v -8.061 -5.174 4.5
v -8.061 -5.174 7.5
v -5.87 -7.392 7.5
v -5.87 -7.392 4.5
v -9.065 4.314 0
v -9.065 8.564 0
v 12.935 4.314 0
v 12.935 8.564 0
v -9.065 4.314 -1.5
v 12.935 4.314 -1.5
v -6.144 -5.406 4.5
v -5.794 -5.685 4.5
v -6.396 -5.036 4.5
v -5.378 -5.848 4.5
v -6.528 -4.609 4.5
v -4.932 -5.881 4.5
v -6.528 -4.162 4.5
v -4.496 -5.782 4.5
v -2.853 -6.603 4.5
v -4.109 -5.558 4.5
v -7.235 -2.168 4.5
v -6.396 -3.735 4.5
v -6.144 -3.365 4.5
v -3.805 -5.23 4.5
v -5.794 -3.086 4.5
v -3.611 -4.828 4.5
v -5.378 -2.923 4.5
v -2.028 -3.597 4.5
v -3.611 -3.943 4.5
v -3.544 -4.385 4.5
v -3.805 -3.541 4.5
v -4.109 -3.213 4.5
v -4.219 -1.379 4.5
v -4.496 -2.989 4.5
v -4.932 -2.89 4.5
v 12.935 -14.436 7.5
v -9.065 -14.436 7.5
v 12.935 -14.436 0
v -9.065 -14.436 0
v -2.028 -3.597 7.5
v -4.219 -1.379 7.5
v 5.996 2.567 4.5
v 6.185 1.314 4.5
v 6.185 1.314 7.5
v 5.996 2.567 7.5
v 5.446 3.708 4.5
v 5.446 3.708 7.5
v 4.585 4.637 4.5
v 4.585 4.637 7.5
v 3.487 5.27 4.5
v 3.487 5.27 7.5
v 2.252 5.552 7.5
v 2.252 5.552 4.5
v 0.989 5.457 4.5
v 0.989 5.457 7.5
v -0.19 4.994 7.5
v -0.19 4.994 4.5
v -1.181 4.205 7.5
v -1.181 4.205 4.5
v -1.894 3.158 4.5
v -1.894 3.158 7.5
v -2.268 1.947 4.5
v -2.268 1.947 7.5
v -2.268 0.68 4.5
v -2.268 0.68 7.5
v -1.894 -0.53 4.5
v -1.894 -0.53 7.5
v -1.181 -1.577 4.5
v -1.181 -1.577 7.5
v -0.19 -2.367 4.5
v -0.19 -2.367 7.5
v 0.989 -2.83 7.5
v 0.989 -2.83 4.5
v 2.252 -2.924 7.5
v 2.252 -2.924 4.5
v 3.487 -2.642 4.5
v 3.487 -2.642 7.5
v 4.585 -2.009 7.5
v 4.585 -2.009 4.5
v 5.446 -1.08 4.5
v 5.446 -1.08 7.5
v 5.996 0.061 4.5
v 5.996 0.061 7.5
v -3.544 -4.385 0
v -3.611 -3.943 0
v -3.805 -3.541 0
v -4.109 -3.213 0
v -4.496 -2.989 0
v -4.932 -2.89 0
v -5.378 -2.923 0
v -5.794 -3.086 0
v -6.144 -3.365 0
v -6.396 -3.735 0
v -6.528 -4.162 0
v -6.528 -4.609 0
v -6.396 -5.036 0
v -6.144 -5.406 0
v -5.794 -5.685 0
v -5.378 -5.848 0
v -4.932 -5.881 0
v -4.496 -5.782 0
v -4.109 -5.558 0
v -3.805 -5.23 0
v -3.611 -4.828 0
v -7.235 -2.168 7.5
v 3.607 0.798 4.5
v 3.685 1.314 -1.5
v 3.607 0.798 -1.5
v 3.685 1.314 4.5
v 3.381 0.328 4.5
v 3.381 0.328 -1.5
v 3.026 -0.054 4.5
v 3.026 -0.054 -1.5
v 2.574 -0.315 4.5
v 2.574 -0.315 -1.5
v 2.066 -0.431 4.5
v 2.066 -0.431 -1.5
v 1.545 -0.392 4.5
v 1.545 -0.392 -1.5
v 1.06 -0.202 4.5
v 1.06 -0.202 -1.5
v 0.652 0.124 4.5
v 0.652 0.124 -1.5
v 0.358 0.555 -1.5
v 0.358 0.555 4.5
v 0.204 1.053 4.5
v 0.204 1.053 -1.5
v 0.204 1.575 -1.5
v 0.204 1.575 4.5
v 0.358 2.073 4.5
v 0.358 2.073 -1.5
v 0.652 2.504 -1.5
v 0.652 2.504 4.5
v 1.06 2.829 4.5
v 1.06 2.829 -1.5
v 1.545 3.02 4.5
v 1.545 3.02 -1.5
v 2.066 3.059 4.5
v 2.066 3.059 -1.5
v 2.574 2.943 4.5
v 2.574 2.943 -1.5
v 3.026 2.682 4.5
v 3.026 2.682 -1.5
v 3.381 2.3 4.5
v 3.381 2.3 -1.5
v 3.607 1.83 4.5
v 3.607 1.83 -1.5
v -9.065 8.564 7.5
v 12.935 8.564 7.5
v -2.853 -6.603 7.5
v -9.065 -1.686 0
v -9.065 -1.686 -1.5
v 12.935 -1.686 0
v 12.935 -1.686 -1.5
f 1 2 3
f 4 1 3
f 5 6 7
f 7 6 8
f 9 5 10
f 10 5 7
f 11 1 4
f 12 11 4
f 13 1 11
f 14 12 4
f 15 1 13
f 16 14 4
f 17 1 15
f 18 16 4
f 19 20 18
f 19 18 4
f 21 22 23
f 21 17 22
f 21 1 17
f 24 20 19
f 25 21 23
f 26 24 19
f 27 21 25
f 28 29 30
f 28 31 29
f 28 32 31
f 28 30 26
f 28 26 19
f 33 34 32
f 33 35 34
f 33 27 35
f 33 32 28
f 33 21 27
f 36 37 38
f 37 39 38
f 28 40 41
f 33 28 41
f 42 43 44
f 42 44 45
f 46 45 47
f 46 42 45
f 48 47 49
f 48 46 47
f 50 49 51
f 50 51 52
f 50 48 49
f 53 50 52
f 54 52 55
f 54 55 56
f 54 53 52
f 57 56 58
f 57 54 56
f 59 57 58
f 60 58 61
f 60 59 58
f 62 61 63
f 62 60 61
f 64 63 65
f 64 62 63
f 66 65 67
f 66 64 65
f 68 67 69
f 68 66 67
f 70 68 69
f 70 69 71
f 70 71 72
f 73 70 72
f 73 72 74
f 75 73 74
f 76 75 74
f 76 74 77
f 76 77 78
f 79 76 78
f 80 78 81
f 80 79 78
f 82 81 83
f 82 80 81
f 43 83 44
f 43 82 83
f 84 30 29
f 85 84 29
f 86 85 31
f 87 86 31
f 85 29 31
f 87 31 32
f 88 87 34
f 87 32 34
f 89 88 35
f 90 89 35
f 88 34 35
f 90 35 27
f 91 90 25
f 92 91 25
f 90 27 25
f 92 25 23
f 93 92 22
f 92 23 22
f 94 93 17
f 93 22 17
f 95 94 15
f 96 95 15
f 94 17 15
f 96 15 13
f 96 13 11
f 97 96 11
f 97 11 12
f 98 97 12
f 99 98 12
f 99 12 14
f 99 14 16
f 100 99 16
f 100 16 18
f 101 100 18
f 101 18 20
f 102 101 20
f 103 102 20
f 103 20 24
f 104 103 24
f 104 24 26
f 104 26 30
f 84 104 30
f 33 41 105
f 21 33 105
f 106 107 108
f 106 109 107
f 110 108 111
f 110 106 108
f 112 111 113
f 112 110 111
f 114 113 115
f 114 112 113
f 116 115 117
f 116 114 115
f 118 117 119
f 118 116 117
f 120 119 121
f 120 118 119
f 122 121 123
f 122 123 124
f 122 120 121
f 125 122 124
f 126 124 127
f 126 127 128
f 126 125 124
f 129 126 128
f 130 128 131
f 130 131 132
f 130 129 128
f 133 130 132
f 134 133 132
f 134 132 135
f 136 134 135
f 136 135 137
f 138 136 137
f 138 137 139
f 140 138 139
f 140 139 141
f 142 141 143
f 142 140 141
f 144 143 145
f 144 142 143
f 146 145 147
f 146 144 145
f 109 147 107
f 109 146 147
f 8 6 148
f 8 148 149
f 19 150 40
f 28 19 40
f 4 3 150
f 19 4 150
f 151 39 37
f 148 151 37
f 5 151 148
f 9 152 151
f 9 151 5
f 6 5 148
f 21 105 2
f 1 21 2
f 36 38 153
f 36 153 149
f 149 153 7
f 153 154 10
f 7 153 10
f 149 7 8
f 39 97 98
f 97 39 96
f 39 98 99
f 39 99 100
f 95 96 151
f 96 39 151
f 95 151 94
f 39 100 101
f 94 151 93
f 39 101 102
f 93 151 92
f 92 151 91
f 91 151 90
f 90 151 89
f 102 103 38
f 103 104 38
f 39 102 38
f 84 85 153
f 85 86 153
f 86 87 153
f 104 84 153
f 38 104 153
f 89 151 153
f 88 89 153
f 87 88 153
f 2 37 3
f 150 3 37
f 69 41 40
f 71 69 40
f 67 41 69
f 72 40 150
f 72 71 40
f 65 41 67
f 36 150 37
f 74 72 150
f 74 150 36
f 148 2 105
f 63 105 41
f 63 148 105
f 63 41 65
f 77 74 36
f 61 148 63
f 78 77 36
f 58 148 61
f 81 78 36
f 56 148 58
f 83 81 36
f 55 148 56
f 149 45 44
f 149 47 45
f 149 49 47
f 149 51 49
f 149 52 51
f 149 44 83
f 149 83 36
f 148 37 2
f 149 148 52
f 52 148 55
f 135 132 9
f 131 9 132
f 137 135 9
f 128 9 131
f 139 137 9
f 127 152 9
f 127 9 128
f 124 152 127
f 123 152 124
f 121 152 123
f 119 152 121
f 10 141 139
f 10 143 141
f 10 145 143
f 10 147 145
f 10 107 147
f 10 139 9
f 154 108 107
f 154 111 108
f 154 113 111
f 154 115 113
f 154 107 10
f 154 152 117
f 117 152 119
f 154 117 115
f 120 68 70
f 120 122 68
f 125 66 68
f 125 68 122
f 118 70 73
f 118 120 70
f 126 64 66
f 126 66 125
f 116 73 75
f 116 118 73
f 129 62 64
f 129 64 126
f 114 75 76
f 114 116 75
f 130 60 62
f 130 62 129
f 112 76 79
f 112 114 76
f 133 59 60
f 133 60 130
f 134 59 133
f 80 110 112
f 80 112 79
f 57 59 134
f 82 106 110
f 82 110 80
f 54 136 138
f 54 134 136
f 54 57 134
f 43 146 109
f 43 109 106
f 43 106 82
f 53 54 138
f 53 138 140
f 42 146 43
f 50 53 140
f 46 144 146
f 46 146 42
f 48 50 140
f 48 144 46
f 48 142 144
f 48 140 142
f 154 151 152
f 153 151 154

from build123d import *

# Parameters (mm, degrees)
F0_W     = 22
F0_H     = 23
F1_DEPTH = 4.5
F2_R     = 1.75
F3_DEPTH = 4.501
F4_W     = 22
F4_H     = 6
F4_R     = 1.75
F5_DEPTH = 1.5
F2_W     = 22
F2_H     = 23
F2_R_2   = 4.25
F2_R_3   = 1.5
F6_DEPTH = 3
F7_R     = 1.5
F8_DEPTH = 3
F9_DEPTH = 9.001


with BuildPart() as f1:
    # F0 (on Top) → F1 (new body)
    with BuildSketch(Plane.XY):
        with Locations((1.9347620532, -2.93618536)):
            Rectangle(F0_W, F0_H)
    extrude(amount=F1_DEPTH)

    # F2 (on face) → F3 (cut, through all)
    with BuildSketch(Plane.XY.offset(4.5)):
        with Locations((1.9347620532, 1.31381464)):
            Circle(F2_R)
    extrude(amount=-F3_DEPTH, mode=Mode.SUBTRACT)

    # F4 (on face) → F5 (join)
    with BuildSketch(Plane(origin=(0, 0, 0), x_dir=(1, 0, 0), z_dir=(0, 0, -1))):
        with Locations((1.9347620532, -1.31381464)):
            Rectangle(F4_W, F4_H)
        with Locations((1.9347620532, -1.31381464)):
            Circle(F4_R, mode=Mode.SUBTRACT)
    extrude(amount=F5_DEPTH)

    # F2 (on face) → F6 (join)
    with BuildSketch(Plane.XY.offset(4.5)):
        with Locations((1.9347620532, -2.93618536)):
            Rectangle(F2_W, F2_H)
        Polygon((-5.8697039075, -7.3919604017), (-8.0607315208, -5.1739888063), (-7.235425581, -2.1675174351), (-4.2190920279, -1.3790176593), (-2.0280644146, -3.5969892546), (-2.8533703544, -6.6034606258), align=None, mode=Mode.SUBTRACT)
        with Locations((1.9347620532, 1.31381464)):
            Circle(F2_R_2, mode=Mode.SUBTRACT)
        Polygon((-7.235425581, -2.1675174351), (-8.0607315208, -5.1739888063), (-5.8697039075, -7.3919604017), (-2.8533703544, -6.6034606258), (-2.0280644146, -3.5969892546), (-4.2190920279, -1.3790176593), align=None)
        with Locations((-5.0443979677, -4.3854890305)):
            Circle(F2_R_3, mode=Mode.SUBTRACT)
        with Locations((-5.0443979677, -4.3854890305)):
            Circle(F2_R_3)
    extrude(amount=F6_DEPTH)

    # F7 (on face) → F8 (cut)
    with BuildSketch(Plane.XY.offset(7.5)):
        Polygon((-2.0280644146, -3.5969892546), (-4.2190920279, -1.3790176593), (-7.235425581, -2.1675174351), (-8.0607315208, -5.1739888063), (-5.8697039075, -7.3919604017), (-2.8533703544, -6.6034606258), align=None)
        with Locations((-5.0443979677, -4.3854890305)):
            Circle(F7_R, mode=Mode.SUBTRACT)
    extrude(amount=-F8_DEPTH, mode=Mode.SUBTRACT)

    # F9 (cut, through all): a face of the model
    f9_faces = [f1.faces().sort_by_distance(p)[0] for p in [
        (-5.0443979677, -4.3854890305, 7.5),
    ]]
    extrude(f9_faces, amount=-F9_DEPTH, mode=Mode.SUBTRACT)


solid = f1.part
